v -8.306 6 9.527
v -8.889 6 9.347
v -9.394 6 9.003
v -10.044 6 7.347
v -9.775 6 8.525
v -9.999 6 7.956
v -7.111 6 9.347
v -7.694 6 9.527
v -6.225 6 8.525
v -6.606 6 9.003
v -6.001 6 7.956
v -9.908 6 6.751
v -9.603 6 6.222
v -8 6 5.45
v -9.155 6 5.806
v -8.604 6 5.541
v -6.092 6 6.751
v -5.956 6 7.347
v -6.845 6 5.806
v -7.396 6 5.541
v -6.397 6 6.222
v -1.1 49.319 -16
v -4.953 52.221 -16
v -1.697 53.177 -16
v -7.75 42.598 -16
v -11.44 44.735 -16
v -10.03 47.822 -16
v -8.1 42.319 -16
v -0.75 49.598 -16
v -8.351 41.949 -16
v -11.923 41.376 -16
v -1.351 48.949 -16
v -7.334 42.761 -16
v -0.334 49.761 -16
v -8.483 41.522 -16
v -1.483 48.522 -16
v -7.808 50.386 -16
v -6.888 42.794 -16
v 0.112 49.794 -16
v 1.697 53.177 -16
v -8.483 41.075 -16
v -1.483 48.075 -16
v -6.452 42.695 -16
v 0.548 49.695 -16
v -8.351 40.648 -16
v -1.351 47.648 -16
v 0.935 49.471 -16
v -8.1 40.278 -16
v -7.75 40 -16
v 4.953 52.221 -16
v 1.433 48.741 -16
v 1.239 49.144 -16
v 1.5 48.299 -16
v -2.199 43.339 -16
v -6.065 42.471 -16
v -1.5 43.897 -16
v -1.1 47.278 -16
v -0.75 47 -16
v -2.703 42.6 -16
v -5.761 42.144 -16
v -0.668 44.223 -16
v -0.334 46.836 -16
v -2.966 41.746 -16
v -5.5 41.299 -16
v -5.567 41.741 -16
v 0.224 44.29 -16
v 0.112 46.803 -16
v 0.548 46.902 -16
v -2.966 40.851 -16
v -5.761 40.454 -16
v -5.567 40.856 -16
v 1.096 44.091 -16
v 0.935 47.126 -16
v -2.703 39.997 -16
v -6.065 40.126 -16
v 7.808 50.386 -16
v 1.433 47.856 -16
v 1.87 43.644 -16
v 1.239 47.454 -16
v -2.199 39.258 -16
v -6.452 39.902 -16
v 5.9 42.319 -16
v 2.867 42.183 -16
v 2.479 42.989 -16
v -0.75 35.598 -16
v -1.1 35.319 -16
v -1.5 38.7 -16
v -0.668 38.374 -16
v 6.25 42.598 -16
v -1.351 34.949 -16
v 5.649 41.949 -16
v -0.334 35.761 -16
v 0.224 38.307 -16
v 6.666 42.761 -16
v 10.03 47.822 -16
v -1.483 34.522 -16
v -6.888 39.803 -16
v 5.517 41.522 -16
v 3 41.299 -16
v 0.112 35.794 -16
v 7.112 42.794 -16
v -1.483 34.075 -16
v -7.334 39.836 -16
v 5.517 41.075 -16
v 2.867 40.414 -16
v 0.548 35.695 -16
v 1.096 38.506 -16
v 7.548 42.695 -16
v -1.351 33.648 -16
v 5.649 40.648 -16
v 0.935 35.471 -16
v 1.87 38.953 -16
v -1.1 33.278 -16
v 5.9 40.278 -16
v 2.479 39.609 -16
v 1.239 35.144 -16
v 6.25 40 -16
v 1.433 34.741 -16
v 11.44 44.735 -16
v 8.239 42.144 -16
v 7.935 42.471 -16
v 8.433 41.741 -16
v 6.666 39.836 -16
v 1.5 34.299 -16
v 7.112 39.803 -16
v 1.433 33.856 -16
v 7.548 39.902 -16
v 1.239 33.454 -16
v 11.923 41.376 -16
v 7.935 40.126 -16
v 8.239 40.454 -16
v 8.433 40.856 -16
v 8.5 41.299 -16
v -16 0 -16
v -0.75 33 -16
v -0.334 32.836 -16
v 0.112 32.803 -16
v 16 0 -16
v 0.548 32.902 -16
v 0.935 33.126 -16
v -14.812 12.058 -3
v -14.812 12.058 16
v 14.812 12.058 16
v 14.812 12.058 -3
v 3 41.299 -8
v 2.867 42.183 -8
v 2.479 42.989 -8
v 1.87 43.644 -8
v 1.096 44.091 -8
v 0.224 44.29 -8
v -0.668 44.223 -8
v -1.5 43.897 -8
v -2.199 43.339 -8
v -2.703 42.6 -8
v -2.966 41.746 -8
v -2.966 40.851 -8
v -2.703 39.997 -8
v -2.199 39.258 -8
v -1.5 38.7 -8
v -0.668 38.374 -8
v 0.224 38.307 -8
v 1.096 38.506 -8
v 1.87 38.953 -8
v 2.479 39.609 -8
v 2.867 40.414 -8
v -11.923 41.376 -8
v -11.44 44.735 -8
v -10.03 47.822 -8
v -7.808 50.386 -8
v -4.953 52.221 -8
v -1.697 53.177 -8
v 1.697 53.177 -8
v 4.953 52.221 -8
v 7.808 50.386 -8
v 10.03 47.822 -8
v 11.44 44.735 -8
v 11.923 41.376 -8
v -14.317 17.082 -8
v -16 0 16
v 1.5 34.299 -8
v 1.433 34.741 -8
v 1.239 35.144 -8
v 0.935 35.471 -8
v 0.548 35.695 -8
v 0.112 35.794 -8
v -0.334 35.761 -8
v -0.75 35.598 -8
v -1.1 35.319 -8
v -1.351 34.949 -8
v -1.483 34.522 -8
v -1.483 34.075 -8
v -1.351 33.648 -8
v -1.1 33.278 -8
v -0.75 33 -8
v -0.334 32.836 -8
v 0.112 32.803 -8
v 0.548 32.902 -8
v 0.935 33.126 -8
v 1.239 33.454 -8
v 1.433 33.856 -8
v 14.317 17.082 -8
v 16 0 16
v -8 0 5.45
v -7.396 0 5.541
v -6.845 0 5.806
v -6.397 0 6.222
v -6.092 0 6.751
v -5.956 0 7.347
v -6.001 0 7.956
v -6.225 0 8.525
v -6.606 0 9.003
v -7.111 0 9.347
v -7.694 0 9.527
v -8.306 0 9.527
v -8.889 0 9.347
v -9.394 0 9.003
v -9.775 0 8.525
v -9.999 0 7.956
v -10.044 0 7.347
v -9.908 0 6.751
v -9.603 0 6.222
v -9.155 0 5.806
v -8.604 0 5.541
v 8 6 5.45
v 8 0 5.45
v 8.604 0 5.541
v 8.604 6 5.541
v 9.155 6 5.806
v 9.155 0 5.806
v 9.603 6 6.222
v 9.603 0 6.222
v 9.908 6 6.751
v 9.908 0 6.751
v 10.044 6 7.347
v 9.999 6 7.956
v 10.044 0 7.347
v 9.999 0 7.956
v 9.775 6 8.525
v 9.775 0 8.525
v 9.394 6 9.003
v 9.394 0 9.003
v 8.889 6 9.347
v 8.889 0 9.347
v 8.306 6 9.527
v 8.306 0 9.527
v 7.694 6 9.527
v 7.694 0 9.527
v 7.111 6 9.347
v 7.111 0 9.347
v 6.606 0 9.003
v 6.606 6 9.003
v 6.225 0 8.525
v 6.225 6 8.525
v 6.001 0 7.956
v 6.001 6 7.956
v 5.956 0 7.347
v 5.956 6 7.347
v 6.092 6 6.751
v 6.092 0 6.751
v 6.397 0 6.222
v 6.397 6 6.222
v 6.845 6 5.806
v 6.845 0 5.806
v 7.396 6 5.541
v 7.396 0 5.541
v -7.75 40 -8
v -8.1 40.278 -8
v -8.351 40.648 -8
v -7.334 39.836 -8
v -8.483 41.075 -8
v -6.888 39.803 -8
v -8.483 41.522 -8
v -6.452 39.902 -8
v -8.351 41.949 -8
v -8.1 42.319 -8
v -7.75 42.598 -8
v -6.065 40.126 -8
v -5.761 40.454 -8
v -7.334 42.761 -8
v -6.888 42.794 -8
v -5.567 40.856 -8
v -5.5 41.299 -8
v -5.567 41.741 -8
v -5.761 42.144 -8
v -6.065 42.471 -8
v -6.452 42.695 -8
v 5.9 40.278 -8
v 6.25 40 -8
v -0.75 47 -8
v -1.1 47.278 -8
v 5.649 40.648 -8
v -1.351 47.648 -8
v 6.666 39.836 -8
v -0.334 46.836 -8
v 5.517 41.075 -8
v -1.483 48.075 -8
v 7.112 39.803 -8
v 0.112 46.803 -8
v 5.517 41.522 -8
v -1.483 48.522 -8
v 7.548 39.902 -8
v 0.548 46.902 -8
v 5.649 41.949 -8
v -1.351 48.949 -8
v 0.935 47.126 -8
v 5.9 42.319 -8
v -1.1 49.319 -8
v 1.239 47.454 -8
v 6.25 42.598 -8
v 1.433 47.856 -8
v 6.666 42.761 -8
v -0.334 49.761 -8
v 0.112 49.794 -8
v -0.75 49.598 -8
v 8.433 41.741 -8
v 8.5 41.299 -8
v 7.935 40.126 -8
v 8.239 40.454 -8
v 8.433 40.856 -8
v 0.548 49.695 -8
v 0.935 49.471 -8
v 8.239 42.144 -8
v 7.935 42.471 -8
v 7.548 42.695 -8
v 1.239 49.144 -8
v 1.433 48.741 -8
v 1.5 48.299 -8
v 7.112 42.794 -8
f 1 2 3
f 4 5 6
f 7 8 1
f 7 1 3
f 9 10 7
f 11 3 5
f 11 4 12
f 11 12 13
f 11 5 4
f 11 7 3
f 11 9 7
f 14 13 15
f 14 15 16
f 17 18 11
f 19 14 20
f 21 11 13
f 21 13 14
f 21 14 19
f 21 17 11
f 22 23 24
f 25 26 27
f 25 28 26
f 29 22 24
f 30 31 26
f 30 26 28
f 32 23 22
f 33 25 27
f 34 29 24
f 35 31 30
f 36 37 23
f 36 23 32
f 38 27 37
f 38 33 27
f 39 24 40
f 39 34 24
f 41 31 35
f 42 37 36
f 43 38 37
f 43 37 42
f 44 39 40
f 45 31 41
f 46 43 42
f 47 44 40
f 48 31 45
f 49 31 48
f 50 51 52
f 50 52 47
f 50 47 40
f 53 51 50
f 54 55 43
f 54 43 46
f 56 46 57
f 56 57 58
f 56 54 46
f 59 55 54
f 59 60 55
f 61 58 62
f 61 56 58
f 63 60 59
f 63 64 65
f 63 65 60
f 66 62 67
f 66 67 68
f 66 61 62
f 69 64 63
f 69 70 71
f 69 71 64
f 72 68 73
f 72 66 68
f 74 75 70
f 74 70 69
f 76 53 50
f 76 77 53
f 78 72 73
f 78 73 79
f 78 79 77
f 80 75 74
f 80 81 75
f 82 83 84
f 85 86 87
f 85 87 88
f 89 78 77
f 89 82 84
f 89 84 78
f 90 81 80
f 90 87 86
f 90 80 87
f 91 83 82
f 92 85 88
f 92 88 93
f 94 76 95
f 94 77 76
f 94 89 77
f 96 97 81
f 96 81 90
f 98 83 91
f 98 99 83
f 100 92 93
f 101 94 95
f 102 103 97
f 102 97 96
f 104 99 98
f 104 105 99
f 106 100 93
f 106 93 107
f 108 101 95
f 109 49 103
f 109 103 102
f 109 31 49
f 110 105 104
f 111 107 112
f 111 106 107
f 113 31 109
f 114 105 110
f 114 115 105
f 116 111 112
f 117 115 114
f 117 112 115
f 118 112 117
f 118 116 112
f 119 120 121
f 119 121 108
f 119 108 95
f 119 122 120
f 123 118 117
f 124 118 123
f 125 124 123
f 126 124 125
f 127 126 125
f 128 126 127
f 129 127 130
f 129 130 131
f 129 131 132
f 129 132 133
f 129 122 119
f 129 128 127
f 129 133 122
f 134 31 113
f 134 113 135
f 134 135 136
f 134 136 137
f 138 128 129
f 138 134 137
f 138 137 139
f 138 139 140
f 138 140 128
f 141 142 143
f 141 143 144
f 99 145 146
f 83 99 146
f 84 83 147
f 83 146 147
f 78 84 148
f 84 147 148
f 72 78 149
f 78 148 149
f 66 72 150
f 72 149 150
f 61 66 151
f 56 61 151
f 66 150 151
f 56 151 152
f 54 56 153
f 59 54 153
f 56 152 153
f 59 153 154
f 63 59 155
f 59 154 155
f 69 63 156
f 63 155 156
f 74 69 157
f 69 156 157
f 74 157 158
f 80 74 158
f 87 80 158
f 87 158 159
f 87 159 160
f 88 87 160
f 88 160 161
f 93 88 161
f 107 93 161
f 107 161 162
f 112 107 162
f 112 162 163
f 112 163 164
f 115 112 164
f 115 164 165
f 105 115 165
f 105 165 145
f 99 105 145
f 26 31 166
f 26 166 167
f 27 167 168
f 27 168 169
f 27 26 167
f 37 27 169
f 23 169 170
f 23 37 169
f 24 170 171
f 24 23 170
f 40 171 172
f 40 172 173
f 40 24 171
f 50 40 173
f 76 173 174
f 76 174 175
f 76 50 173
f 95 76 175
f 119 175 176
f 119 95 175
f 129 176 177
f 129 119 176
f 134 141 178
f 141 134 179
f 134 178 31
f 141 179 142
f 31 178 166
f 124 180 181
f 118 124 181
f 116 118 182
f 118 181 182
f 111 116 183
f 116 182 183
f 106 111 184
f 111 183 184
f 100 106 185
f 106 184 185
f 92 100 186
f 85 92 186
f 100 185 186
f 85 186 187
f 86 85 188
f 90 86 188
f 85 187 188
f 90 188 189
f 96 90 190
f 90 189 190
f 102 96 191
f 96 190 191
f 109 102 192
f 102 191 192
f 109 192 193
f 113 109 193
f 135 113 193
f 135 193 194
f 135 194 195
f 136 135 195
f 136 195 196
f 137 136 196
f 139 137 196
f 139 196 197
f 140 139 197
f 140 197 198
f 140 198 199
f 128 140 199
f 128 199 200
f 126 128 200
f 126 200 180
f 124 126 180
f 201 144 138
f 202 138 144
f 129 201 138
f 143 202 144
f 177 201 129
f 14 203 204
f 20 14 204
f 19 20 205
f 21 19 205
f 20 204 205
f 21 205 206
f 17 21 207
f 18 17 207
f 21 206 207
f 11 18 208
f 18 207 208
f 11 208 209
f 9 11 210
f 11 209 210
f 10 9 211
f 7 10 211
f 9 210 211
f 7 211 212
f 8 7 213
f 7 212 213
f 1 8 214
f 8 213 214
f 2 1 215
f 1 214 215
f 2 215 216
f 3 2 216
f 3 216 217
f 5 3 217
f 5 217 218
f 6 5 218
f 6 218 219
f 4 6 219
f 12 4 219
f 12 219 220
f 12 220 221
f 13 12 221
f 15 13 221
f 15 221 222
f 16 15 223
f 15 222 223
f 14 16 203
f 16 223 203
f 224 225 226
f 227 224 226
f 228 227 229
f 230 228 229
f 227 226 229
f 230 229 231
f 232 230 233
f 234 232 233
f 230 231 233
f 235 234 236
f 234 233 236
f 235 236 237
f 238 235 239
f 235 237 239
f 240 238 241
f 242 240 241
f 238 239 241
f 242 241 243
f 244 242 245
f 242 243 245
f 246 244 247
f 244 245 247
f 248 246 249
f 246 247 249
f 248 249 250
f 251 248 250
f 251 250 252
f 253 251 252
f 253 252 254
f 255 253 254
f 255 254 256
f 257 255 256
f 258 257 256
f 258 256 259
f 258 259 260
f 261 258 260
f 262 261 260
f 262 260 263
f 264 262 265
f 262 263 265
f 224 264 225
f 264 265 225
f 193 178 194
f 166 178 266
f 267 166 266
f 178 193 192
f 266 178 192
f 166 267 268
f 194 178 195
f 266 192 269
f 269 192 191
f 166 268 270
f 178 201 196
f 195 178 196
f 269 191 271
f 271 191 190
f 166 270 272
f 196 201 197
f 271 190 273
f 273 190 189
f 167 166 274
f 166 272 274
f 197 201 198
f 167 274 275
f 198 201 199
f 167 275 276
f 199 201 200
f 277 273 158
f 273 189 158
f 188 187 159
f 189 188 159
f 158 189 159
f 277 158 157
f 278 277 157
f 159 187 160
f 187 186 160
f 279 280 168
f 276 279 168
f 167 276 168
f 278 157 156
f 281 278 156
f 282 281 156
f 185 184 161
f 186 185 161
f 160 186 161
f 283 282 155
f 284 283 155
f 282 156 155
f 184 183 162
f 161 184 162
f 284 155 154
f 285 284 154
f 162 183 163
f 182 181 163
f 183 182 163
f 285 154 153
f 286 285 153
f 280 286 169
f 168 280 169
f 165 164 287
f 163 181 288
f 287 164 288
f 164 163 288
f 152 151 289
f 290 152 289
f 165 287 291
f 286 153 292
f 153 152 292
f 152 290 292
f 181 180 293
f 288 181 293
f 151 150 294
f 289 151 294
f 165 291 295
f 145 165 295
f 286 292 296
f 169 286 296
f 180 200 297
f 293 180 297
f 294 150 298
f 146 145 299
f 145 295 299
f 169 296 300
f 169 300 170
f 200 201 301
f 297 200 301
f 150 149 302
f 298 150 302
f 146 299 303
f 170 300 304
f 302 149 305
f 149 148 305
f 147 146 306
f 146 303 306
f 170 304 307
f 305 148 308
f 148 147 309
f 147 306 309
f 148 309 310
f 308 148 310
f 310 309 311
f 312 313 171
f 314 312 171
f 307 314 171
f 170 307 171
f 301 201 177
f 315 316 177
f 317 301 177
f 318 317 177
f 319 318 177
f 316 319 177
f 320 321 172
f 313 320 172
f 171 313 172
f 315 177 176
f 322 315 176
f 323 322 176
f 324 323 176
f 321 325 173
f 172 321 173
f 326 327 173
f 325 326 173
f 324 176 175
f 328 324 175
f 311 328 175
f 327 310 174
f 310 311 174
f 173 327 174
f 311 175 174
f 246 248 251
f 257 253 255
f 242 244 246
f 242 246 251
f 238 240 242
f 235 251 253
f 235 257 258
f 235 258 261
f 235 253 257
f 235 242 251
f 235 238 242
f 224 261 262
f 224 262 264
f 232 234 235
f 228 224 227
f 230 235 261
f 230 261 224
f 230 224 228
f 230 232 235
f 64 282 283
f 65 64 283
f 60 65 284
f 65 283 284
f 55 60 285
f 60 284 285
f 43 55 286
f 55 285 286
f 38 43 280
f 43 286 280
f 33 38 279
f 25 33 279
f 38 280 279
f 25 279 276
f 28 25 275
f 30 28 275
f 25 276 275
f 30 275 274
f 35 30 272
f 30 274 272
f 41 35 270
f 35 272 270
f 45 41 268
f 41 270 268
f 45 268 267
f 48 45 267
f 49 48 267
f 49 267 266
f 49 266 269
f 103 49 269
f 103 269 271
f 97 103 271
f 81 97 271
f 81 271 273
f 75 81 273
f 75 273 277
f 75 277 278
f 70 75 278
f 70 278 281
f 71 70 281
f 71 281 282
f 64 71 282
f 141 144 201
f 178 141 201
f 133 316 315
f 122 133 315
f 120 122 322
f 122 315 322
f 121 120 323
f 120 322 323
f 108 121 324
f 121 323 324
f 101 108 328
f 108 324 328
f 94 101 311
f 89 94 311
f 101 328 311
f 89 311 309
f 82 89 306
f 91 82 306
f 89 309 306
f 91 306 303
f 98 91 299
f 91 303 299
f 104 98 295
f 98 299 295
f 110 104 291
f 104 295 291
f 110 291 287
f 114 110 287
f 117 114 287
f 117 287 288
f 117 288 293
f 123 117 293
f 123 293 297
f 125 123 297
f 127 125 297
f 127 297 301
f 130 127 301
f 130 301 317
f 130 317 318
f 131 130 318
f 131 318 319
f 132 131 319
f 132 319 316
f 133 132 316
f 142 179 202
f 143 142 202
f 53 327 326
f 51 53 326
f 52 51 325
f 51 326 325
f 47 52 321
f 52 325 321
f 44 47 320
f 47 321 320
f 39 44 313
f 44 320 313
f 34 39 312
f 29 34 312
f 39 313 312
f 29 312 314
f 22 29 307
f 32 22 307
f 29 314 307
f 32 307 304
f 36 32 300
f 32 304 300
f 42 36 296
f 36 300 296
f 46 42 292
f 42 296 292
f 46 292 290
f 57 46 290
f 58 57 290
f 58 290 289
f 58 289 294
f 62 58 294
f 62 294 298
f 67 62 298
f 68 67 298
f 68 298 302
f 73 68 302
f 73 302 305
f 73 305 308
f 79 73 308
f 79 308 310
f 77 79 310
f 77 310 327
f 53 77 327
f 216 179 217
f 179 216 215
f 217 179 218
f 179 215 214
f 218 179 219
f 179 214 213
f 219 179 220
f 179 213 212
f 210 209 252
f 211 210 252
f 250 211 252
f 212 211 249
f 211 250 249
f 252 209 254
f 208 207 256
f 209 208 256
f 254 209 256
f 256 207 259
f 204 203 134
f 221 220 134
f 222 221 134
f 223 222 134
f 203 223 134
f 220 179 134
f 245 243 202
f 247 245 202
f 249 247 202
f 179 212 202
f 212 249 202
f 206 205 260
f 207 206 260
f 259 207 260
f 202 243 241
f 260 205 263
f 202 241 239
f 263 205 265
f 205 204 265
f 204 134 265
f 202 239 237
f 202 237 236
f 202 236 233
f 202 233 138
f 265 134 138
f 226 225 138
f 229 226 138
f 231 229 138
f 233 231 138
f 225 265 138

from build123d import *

# Parameters (mm, degrees)
CROQUIS1_W              = 32
CROQUIS1_H              = 32
SALIENTE_EXTRUIR1_DEPTH = 42
CORTAR_EXTRUIR1_DEPTH   = 42
CROQUIS3_W              = 8
CROQUIS3_H              = 0.624082803
CORTAR_EXTRUIR2_DEPTH   = 42
CORTAR_EXTRUIR3_DEPTH   = 55.698871322
CROQUIS7_R              = 11.922640385
SALIENTE_EXTRUIR3_DEPTH = 8
CROQUIS8_R              = 3
CROQUIS8_R_2            = 1.5
CORTAR_EXTRUIR5_DEPTH   = 61.603104214
CROQUIS9_R              = 2.05
CORTAR_EXTRUIR6_DEPTH   = 6


with BuildPart() as part:
    # Croquis1 → Saliente-Extruir1 (new body)
    with BuildSketch(Plane(origin=(0, 0, 0), x_dir=(1, 0, 0), z_dir=(0, 1, 0))):
        Rectangle(CROQUIS1_W, CROQUIS1_H)
    extrude(amount=SALIENTE_EXTRUIR1_DEPTH)

    # Croquis2 → Cortar-Extruir1 (cut)
    with BuildSketch(Plane(origin=(16, 0, 0), x_dir=(0, 0, -1), z_dir=(1, 0, 0))):
        Polygon((-16, 12.058), (3, 12.058), (8, 17.081917197), (8, 42), (-16, 42), align=None)
    extrude(amount=-CORTAR_EXTRUIR1_DEPTH, mode=Mode.SUBTRACT)

    # Croquis3 → Cortar-Extruir2 (cut)
    with BuildSketch(Plane(origin=(16, 0, 0), x_dir=(0, 0, -1), z_dir=(1, 0, 0))):
        with Locations((12, 41.687958599)):
            Rectangle(CROQUIS3_W, CROQUIS3_H)
    extrude(amount=-CORTAR_EXTRUIR2_DEPTH, mode=Mode.SUBTRACT)

    # Croquis6 → Cortar-Extruir3 (cut, through all)
    with BuildSketch(Plane.XY.offset(16)):
        Polygon((-16, 0), (-11.922640385, 41.375917197), (-16, 41.375917197), align=None)
        Polygon((16, 0), (11.922640385, 41.375917197), (16, 41.375917197), align=None)
    extrude(amount=-CORTAR_EXTRUIR3_DEPTH, mode=Mode.SUBTRACT)

    # Croquis7 → Saliente-Extruir3 (add)
    with BuildSketch(Plane(origin=(0, 0, -16), x_dir=(-1, 0, 0), z_dir=(0, 0, -1))):
        with Locations((0, 41.375917197)):
            Circle(CROQUIS7_R)
    extrude(amount=-SALIENTE_EXTRUIR3_DEPTH)

    # Croquis8 → Cortar-Extruir5 (cut, through all)
    with BuildSketch(Plane.XY.offset(-8)):
        with Locations((0, 41.298557582)):
            Circle(CROQUIS8_R)
        with Locations((1.182e-06, 48.298557582)):
            Circle(CROQUIS8_R_2)
        with Locations((7, 41.2985564)):
            Circle(CROQUIS8_R_2)
        with Locations((-1.182e-06, 34.298557582)):
            Circle(CROQUIS8_R_2)
        with Locations((-7, 41.298558764)):
            Circle(CROQUIS8_R_2)
    extrude(amount=-CORTAR_EXTRUIR5_DEPTH, mode=Mode.SUBTRACT)

    # Croquis9 → Cortar-Extruir6 (cut)
    with BuildSketch(Plane.XZ):
        with Locations(Location((-8, 7.5, 0), (0, 0, 270))):
            Circle(CROQUIS9_R)
        with Locations(Location((8, 7.5, 0), (0, 0, 270))):
            Circle(CROQUIS9_R)
    extrude(amount=-CORTAR_EXTRUIR6_DEPTH, mode=Mode.SUBTRACT)


solid = part.part
